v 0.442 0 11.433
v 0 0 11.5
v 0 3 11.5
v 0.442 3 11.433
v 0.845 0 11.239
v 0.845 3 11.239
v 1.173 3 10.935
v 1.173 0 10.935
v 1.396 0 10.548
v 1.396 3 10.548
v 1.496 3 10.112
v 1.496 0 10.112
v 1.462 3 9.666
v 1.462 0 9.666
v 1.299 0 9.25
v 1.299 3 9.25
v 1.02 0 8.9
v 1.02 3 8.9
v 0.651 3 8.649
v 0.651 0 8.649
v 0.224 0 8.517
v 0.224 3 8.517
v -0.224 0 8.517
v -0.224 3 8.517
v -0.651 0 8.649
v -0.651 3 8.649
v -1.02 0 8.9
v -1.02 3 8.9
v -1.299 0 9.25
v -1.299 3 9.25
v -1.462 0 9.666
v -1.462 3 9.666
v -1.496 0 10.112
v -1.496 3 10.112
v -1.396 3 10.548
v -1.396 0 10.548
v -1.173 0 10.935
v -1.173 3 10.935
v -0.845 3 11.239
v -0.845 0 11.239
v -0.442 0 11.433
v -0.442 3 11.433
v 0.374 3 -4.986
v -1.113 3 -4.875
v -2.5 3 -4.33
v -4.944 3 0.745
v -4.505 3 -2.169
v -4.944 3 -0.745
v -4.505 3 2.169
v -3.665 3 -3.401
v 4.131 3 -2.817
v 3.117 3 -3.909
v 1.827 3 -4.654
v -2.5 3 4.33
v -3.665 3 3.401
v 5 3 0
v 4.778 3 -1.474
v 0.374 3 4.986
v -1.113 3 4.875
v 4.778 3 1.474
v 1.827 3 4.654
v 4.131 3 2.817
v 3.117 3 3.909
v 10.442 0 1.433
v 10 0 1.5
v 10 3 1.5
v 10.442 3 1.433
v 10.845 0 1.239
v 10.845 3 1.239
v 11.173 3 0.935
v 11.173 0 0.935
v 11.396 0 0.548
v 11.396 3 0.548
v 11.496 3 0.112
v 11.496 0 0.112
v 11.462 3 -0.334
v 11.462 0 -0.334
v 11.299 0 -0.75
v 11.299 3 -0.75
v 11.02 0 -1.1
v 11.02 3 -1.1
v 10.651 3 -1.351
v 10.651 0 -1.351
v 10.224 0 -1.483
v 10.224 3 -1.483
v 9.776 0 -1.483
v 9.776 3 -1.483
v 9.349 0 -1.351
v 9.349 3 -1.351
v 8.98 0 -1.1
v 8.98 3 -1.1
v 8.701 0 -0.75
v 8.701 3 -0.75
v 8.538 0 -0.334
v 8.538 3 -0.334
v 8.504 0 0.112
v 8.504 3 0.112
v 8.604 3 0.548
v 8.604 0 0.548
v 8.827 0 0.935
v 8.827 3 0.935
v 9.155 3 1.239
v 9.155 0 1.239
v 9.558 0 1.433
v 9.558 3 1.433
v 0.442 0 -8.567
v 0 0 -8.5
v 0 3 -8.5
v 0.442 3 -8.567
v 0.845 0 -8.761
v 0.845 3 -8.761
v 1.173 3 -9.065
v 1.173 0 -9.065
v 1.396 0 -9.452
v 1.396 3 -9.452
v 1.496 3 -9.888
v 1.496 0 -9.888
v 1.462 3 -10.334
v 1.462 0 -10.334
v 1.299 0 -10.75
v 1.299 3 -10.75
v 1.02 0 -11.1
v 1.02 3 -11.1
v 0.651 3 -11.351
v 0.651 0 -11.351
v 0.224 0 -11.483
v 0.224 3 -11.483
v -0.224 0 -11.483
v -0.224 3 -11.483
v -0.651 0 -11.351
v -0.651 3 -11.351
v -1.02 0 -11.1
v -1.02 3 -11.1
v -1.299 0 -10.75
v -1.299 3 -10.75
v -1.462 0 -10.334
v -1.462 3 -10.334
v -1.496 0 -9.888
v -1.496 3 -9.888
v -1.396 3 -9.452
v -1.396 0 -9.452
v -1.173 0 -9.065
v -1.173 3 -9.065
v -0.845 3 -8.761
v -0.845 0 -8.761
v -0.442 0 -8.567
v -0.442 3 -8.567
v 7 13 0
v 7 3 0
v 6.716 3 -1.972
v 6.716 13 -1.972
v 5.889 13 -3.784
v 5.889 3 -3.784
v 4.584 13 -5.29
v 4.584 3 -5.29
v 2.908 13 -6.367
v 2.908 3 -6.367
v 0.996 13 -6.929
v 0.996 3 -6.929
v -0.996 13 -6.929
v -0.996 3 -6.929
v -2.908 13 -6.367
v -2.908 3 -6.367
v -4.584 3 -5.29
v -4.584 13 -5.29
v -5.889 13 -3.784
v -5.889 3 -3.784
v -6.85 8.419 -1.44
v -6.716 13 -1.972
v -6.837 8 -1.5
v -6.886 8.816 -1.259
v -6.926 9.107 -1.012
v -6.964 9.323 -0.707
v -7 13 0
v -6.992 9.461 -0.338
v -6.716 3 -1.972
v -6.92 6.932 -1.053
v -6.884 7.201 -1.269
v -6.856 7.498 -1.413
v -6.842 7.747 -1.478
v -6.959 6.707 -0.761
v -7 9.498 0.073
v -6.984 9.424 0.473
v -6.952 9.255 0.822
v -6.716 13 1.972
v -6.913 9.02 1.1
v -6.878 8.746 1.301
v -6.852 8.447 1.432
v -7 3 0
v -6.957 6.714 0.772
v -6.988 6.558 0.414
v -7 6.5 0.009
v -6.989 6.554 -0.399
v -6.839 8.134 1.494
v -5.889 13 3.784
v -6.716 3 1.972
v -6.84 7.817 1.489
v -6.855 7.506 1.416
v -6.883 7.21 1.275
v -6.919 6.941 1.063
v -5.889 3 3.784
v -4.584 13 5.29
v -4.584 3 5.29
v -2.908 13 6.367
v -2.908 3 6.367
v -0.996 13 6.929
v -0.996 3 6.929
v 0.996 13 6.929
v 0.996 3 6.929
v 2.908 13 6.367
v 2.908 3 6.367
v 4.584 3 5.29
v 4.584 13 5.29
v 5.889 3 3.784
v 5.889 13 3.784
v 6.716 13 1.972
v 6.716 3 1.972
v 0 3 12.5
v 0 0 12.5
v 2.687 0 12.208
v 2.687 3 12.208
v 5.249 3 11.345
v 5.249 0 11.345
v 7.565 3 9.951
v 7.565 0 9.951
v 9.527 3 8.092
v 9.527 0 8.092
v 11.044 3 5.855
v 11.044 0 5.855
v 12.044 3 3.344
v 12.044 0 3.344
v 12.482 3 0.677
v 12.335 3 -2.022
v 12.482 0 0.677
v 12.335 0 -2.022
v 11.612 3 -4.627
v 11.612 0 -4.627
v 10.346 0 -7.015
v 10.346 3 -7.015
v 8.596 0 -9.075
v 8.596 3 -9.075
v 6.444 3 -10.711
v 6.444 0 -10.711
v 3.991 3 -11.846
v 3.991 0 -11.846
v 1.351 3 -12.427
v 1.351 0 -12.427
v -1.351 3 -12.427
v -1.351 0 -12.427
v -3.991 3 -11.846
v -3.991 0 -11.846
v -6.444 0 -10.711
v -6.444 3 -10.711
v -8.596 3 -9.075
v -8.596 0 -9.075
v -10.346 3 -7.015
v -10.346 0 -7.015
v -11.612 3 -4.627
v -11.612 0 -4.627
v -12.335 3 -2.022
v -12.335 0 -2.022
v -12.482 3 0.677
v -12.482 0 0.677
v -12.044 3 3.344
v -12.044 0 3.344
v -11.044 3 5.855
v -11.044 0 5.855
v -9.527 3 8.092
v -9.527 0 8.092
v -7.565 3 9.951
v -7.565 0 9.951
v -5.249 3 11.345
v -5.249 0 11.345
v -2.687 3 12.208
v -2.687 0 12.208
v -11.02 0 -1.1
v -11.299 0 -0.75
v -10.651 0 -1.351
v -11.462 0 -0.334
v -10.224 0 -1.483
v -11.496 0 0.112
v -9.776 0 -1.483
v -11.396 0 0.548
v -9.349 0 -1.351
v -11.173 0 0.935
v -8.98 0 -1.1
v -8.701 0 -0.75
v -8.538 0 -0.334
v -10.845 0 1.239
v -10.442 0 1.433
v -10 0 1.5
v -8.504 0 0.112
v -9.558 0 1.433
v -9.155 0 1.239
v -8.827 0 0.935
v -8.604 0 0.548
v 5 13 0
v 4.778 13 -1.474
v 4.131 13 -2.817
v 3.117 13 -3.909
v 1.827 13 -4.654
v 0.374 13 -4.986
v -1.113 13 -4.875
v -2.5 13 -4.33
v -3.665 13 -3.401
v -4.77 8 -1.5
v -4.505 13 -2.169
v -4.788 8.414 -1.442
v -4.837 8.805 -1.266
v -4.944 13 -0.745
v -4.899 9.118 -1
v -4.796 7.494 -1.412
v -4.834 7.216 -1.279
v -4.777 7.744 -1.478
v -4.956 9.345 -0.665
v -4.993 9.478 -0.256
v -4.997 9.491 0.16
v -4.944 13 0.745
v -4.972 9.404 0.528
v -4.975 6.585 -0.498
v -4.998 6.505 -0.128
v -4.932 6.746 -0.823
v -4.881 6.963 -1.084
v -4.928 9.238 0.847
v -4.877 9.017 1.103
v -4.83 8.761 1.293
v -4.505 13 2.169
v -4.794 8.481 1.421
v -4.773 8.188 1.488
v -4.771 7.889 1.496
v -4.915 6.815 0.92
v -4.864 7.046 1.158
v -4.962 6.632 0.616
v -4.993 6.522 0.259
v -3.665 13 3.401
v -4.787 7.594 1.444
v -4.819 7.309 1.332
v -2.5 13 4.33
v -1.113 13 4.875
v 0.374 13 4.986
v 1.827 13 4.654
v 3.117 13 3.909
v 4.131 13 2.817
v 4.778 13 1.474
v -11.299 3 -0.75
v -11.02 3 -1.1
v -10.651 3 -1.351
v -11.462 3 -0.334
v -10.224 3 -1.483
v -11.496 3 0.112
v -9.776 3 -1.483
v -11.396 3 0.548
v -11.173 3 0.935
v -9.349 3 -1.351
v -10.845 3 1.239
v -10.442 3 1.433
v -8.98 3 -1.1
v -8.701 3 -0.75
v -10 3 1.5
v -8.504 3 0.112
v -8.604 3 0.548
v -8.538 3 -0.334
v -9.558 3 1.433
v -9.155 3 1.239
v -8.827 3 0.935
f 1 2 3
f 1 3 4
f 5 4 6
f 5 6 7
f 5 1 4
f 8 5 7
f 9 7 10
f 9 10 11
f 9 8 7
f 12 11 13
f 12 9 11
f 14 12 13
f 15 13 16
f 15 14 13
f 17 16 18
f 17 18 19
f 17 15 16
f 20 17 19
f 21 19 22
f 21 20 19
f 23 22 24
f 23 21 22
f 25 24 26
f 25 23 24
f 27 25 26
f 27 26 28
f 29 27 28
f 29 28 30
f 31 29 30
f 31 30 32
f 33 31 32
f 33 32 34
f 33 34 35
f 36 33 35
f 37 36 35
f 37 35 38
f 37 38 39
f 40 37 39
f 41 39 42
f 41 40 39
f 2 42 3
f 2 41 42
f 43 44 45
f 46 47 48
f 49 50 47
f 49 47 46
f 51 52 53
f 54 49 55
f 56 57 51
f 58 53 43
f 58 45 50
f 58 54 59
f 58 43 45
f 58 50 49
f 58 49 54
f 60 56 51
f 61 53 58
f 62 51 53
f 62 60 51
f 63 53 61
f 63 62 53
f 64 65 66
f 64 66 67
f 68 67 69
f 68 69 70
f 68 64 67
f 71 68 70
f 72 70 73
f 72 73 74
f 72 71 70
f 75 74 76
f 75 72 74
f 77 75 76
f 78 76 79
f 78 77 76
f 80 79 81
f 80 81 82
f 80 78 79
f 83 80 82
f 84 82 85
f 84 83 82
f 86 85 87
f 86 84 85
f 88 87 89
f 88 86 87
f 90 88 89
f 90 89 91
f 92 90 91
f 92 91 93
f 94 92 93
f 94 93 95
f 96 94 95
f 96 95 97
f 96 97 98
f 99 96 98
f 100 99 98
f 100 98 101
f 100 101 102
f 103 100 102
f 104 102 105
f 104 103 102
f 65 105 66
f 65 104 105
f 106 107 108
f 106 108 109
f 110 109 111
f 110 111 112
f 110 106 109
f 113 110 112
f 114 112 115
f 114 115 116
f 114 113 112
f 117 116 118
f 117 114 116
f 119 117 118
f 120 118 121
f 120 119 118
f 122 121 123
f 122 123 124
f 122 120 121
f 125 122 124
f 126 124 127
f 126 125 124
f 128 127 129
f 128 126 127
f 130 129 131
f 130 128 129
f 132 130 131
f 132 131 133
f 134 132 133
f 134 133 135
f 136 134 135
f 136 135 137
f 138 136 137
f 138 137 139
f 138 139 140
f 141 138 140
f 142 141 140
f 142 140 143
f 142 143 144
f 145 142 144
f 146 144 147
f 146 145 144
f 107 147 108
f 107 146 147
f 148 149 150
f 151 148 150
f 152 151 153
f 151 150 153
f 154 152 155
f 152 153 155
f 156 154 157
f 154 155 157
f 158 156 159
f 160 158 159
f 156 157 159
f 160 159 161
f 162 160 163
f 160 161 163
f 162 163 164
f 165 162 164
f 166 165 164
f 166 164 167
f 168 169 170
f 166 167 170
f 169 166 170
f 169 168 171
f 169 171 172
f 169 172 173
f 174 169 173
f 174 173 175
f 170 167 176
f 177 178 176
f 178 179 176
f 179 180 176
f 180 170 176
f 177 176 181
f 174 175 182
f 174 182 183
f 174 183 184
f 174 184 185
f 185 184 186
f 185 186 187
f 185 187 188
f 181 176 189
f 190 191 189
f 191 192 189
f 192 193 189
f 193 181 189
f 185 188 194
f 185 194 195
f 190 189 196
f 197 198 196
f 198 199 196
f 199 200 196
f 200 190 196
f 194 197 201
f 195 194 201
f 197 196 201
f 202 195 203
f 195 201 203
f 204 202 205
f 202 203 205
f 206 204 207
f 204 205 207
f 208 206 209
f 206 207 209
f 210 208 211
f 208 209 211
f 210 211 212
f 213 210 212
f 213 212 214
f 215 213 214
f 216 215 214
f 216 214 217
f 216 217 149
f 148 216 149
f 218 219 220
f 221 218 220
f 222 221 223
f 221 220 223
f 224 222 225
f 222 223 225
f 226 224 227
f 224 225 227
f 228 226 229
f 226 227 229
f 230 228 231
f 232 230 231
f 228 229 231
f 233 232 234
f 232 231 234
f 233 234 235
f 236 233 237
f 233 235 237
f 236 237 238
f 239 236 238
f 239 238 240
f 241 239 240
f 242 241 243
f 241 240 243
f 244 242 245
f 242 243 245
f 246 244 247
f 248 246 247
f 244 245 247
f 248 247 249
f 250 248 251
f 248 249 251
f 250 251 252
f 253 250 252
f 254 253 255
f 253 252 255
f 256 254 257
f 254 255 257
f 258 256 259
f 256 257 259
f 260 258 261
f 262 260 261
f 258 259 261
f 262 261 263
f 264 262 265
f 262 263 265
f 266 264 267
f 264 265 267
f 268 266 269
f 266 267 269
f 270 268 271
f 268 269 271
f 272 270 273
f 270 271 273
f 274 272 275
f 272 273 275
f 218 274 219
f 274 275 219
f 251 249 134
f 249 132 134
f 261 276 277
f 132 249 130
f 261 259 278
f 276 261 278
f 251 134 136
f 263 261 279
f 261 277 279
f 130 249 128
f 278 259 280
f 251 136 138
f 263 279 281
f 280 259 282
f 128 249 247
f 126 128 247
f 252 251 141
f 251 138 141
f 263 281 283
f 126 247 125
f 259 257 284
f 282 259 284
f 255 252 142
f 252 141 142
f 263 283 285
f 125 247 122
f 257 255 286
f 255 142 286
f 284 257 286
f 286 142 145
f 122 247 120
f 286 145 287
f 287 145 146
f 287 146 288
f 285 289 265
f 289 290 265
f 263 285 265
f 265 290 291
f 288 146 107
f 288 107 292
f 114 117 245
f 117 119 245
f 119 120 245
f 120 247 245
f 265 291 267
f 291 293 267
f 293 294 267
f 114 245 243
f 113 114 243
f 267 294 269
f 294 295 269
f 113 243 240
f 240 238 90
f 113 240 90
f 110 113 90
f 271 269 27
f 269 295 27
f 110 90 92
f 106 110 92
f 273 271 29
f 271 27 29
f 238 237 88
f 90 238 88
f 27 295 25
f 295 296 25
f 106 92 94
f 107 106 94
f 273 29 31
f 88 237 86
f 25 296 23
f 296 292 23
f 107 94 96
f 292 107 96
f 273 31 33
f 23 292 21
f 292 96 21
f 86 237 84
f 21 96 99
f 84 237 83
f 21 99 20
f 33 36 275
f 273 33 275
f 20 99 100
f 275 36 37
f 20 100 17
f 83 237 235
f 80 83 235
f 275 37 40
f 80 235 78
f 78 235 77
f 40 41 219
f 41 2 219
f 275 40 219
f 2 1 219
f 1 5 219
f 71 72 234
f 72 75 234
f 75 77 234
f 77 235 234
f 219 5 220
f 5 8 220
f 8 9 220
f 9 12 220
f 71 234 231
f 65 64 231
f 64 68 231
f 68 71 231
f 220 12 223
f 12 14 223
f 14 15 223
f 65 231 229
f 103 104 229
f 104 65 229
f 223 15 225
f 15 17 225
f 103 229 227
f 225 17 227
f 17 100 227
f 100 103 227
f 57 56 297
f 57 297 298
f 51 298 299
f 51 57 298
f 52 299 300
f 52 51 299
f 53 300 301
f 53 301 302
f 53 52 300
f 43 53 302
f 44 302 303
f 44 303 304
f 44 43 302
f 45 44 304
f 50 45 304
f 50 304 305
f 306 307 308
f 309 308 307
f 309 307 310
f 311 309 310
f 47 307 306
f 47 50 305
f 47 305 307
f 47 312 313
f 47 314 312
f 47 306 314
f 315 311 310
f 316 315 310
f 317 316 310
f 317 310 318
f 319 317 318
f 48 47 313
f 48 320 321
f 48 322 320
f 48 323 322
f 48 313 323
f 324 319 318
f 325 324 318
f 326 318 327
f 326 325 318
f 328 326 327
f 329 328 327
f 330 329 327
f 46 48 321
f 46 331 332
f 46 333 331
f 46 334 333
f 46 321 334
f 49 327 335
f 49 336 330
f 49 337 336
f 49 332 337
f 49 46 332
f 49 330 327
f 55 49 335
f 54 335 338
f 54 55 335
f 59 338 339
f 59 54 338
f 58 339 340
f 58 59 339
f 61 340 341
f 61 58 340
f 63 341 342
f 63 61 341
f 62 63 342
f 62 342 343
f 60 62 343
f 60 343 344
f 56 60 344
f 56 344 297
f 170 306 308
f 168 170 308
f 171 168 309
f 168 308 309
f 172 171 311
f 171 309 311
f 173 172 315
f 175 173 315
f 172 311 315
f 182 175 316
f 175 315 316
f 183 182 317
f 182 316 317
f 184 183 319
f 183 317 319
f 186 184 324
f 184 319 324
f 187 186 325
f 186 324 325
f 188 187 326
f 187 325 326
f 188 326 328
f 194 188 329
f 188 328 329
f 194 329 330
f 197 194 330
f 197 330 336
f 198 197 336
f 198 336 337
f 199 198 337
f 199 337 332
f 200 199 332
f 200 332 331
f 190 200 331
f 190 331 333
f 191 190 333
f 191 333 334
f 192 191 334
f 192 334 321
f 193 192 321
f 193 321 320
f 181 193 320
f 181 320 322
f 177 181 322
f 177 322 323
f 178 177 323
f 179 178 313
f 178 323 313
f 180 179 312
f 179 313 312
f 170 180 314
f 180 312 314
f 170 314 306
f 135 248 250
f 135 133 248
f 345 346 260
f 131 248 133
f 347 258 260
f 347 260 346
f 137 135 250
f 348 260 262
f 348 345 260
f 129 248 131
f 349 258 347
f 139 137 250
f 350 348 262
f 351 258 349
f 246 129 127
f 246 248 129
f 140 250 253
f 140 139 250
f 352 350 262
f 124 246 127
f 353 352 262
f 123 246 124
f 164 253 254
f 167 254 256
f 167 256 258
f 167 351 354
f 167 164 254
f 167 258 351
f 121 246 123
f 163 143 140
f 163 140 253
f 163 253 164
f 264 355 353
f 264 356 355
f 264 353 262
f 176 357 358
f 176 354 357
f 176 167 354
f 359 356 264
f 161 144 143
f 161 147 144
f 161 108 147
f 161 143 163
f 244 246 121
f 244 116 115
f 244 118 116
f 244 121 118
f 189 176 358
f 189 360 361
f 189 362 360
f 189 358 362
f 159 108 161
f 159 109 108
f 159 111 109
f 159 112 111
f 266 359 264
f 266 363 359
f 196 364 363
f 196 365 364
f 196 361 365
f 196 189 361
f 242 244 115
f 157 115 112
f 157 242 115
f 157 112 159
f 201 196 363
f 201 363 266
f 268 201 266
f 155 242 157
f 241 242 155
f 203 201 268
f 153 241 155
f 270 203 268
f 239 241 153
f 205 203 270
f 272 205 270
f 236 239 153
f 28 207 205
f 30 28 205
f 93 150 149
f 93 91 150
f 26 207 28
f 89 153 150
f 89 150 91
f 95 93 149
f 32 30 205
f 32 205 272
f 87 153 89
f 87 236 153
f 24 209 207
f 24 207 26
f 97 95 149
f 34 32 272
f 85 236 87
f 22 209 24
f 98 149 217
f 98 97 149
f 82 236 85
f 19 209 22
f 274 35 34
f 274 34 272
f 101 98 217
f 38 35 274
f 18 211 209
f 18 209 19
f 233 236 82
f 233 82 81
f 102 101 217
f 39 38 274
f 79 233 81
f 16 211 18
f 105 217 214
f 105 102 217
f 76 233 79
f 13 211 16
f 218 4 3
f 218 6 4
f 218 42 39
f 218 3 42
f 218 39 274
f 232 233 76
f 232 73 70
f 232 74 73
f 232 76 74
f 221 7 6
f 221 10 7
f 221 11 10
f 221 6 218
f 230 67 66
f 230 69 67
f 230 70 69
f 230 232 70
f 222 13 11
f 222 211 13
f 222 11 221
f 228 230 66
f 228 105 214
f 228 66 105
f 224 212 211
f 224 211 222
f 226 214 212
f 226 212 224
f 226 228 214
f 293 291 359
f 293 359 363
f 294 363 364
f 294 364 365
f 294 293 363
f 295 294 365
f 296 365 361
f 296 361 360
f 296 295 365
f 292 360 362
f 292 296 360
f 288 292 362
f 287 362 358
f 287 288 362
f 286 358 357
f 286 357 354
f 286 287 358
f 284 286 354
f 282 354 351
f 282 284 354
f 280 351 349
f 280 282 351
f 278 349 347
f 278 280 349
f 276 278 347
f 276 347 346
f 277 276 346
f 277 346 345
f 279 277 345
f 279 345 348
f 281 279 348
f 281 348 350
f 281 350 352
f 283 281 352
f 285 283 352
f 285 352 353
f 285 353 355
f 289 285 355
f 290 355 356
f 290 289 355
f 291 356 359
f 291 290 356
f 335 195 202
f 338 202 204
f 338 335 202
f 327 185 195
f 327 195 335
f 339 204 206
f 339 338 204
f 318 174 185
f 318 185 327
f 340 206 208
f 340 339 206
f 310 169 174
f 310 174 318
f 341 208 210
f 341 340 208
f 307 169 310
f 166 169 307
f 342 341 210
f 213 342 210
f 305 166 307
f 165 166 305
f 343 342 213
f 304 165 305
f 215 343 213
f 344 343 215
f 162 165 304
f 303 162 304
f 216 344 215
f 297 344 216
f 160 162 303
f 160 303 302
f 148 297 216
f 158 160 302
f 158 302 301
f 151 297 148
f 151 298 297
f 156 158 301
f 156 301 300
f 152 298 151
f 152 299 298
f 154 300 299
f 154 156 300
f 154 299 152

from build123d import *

# Parameters (mm, degrees)
IZIM1_R                     = 12.5
IZIM1_R_2                   = 1.5
Y_KSEKLIK_EKSTR_ZYON1_DEPTH = 3
IZIM2_R                     = 7
IZIM2_R_2                   = 5
EKSTR_ZYON_NCE1_DEPTH       = 10
IZIM3_R                     = 1.5
KES_EKSTR_ZYON1_DEPTH       = 22.943108257


with BuildPart() as part:
    # Çizim1 → Yükseklik-Ekstrüzyon1 (new body)
    with BuildSketch(Plane(origin=(0, 0, 0), x_dir=(1, 0, 0), z_dir=(0, 1, 0))):
        with Locations(Location((0, 0, 0), (0, 0, 270))):
            Circle(IZIM1_R)
        with Locations(Location((10, 0, 0), (0, 0, 270))):
            Circle(IZIM1_R_2, mode=Mode.SUBTRACT)
        with Locations(Location((0, -10, 0), (0, 0, 270))):
            Circle(IZIM1_R_2, mode=Mode.SUBTRACT)
        with Locations(Location((-10, 0, 0), (0, 0, 270))):
            Circle(IZIM1_R_2, mode=Mode.SUBTRACT)
        with Locations(Location((0, 10, 0), (0, 0, 270))):
            Circle(IZIM1_R_2, mode=Mode.SUBTRACT)
    extrude(amount=Y_KSEKLIK_EKSTR_ZYON1_DEPTH)

    # Çizim2 → Ekstrüzyon-İnce1 (add)
    with BuildSketch(Plane(origin=(0, 3, 0), x_dir=(1, 0, 0), z_dir=(0, 1, 0))):
        Circle(IZIM2_R)
        Circle(IZIM2_R_2, mode=Mode.SUBTRACT)
    extrude(amount=EKSTR_ZYON_NCE1_DEPTH)

    # Çizim3 → Kes-Ekstrüzyon1 (cut, through all)
    with BuildSketch(Plane(origin=(0, 0, 0), x_dir=(0, 0, -1), z_dir=(1, 0, 0))):
        with Locations((0, 8)):
            Circle(IZIM3_R)
    extrude(amount=-KES_EKSTR_ZYON1_DEPTH, mode=Mode.SUBTRACT)


solid = part.part
